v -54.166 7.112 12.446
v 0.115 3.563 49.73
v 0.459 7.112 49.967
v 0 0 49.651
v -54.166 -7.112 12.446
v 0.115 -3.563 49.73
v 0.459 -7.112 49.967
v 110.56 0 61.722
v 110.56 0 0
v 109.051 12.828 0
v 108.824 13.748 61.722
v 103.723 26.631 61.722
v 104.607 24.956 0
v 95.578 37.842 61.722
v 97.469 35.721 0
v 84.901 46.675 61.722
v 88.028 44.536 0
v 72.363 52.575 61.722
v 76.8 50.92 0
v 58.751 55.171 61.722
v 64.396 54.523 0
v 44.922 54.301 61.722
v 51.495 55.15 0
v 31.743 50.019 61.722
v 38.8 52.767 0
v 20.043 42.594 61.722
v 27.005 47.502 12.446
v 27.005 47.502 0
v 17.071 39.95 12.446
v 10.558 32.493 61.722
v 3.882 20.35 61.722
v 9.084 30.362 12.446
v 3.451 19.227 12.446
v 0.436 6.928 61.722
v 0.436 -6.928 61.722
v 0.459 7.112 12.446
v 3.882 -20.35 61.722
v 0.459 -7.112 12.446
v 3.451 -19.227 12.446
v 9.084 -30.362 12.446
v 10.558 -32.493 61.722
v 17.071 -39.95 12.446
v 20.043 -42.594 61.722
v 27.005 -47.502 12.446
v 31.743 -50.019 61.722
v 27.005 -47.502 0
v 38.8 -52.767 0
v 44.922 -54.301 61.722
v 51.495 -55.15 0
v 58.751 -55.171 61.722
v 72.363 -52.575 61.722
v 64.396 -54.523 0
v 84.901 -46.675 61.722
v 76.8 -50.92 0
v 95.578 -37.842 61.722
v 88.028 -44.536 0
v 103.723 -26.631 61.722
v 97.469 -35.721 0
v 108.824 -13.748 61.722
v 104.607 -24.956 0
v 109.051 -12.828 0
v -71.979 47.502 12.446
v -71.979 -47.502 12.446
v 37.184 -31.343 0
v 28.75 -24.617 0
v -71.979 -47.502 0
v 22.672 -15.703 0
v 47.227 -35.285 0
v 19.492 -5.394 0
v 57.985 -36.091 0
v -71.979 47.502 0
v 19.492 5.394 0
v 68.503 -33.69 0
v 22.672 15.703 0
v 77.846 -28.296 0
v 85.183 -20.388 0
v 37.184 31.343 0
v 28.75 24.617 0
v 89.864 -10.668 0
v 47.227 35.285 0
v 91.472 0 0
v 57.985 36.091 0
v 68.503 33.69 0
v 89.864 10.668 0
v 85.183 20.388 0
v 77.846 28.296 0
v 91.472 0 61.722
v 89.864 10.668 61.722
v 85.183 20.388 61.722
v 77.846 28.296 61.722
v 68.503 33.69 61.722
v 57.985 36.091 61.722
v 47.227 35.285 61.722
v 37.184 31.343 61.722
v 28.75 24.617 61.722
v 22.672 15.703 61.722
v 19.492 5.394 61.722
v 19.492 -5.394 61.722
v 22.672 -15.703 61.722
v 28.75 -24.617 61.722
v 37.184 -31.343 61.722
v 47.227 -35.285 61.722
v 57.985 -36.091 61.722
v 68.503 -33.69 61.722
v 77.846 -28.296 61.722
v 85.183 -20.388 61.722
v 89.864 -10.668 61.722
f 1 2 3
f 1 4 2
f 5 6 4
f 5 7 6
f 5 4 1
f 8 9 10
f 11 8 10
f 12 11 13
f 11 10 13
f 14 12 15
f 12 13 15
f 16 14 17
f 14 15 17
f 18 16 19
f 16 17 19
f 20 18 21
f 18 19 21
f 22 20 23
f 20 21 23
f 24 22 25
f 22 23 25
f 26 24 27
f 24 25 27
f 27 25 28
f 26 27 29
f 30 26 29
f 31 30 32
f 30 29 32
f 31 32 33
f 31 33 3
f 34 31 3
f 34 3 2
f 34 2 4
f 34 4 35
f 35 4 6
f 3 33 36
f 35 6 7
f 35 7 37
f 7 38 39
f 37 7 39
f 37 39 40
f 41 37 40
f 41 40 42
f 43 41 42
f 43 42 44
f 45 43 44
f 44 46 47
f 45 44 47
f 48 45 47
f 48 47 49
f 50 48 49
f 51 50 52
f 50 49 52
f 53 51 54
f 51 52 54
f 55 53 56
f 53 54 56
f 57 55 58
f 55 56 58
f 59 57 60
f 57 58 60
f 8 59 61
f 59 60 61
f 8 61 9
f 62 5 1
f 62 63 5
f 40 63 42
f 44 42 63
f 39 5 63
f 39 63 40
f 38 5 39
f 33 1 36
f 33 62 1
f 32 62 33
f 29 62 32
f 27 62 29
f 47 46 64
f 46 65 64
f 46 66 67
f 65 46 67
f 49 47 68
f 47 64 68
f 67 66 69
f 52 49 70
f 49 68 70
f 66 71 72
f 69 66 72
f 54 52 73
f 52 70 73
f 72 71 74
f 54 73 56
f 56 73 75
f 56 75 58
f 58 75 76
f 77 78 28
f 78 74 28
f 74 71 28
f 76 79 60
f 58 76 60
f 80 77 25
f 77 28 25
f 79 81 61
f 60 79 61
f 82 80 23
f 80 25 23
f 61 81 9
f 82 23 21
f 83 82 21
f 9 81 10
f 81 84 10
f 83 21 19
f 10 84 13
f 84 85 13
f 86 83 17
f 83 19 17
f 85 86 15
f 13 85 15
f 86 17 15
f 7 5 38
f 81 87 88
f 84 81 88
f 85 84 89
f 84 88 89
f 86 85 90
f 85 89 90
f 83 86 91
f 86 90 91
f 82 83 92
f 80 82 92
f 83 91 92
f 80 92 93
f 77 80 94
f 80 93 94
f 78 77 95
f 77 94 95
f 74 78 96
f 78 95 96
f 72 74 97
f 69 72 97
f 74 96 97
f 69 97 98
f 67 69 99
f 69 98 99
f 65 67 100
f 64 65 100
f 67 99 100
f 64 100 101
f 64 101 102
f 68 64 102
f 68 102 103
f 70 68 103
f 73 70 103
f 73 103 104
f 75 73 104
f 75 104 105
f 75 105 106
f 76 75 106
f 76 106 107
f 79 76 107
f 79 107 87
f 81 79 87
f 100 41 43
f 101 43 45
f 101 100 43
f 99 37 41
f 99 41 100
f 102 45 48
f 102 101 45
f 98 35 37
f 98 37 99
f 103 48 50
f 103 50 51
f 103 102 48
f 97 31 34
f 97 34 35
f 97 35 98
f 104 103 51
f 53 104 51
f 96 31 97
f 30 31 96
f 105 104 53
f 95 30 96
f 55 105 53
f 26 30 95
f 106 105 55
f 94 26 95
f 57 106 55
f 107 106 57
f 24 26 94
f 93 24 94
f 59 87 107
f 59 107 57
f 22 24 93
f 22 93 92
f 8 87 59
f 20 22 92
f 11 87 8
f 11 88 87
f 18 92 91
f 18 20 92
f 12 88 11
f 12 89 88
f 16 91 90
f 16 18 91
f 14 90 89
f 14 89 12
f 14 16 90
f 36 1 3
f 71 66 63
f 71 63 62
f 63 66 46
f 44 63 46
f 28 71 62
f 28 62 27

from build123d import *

# Parameters (mm, degrees)
F0_W     = 143.9583450556
F0_H     = 95.0037688017
F1_DEPTH = 12.446
F2_R     = 55.2801974118
F3_DEPTH = 61.722
F4_R     = 36.192071595
F5_DEPTH = 61.723
F7_DEPTH = 7.112


with BuildPart() as f1:
    # F0 (on Top) → F1 (new body)
    with BuildSketch(Plane.XY):
        Rectangle(F0_W, F0_H)
    extrude(amount=F1_DEPTH)

    # F2 (on Top) → F3 (join)
    with BuildSketch(Plane.XY):
        with Locations((55.2801974118, 0)):
            Circle(F2_R)
    extrude(amount=F3_DEPTH)

    # F4 (on face) → F5 (cut, through all)
    with BuildSketch(Plane.XY.offset(61.722)):
        with Locations((55.2801974118, 0)):
            Circle(F4_R)
    extrude(amount=-F5_DEPTH, mode=Mode.SUBTRACT)

    # F6 (on Front) → F7 (join, symmetric)
    with BuildSketch(Plane.XZ):
        Polygon((9.263087064, 7.2733671404), (9.263087064, 56.0136325657), (-61.6970062256, 7.2733671404), align=None)
    extrude(amount=F7_DEPTH, both=True)


solid = f1.part
